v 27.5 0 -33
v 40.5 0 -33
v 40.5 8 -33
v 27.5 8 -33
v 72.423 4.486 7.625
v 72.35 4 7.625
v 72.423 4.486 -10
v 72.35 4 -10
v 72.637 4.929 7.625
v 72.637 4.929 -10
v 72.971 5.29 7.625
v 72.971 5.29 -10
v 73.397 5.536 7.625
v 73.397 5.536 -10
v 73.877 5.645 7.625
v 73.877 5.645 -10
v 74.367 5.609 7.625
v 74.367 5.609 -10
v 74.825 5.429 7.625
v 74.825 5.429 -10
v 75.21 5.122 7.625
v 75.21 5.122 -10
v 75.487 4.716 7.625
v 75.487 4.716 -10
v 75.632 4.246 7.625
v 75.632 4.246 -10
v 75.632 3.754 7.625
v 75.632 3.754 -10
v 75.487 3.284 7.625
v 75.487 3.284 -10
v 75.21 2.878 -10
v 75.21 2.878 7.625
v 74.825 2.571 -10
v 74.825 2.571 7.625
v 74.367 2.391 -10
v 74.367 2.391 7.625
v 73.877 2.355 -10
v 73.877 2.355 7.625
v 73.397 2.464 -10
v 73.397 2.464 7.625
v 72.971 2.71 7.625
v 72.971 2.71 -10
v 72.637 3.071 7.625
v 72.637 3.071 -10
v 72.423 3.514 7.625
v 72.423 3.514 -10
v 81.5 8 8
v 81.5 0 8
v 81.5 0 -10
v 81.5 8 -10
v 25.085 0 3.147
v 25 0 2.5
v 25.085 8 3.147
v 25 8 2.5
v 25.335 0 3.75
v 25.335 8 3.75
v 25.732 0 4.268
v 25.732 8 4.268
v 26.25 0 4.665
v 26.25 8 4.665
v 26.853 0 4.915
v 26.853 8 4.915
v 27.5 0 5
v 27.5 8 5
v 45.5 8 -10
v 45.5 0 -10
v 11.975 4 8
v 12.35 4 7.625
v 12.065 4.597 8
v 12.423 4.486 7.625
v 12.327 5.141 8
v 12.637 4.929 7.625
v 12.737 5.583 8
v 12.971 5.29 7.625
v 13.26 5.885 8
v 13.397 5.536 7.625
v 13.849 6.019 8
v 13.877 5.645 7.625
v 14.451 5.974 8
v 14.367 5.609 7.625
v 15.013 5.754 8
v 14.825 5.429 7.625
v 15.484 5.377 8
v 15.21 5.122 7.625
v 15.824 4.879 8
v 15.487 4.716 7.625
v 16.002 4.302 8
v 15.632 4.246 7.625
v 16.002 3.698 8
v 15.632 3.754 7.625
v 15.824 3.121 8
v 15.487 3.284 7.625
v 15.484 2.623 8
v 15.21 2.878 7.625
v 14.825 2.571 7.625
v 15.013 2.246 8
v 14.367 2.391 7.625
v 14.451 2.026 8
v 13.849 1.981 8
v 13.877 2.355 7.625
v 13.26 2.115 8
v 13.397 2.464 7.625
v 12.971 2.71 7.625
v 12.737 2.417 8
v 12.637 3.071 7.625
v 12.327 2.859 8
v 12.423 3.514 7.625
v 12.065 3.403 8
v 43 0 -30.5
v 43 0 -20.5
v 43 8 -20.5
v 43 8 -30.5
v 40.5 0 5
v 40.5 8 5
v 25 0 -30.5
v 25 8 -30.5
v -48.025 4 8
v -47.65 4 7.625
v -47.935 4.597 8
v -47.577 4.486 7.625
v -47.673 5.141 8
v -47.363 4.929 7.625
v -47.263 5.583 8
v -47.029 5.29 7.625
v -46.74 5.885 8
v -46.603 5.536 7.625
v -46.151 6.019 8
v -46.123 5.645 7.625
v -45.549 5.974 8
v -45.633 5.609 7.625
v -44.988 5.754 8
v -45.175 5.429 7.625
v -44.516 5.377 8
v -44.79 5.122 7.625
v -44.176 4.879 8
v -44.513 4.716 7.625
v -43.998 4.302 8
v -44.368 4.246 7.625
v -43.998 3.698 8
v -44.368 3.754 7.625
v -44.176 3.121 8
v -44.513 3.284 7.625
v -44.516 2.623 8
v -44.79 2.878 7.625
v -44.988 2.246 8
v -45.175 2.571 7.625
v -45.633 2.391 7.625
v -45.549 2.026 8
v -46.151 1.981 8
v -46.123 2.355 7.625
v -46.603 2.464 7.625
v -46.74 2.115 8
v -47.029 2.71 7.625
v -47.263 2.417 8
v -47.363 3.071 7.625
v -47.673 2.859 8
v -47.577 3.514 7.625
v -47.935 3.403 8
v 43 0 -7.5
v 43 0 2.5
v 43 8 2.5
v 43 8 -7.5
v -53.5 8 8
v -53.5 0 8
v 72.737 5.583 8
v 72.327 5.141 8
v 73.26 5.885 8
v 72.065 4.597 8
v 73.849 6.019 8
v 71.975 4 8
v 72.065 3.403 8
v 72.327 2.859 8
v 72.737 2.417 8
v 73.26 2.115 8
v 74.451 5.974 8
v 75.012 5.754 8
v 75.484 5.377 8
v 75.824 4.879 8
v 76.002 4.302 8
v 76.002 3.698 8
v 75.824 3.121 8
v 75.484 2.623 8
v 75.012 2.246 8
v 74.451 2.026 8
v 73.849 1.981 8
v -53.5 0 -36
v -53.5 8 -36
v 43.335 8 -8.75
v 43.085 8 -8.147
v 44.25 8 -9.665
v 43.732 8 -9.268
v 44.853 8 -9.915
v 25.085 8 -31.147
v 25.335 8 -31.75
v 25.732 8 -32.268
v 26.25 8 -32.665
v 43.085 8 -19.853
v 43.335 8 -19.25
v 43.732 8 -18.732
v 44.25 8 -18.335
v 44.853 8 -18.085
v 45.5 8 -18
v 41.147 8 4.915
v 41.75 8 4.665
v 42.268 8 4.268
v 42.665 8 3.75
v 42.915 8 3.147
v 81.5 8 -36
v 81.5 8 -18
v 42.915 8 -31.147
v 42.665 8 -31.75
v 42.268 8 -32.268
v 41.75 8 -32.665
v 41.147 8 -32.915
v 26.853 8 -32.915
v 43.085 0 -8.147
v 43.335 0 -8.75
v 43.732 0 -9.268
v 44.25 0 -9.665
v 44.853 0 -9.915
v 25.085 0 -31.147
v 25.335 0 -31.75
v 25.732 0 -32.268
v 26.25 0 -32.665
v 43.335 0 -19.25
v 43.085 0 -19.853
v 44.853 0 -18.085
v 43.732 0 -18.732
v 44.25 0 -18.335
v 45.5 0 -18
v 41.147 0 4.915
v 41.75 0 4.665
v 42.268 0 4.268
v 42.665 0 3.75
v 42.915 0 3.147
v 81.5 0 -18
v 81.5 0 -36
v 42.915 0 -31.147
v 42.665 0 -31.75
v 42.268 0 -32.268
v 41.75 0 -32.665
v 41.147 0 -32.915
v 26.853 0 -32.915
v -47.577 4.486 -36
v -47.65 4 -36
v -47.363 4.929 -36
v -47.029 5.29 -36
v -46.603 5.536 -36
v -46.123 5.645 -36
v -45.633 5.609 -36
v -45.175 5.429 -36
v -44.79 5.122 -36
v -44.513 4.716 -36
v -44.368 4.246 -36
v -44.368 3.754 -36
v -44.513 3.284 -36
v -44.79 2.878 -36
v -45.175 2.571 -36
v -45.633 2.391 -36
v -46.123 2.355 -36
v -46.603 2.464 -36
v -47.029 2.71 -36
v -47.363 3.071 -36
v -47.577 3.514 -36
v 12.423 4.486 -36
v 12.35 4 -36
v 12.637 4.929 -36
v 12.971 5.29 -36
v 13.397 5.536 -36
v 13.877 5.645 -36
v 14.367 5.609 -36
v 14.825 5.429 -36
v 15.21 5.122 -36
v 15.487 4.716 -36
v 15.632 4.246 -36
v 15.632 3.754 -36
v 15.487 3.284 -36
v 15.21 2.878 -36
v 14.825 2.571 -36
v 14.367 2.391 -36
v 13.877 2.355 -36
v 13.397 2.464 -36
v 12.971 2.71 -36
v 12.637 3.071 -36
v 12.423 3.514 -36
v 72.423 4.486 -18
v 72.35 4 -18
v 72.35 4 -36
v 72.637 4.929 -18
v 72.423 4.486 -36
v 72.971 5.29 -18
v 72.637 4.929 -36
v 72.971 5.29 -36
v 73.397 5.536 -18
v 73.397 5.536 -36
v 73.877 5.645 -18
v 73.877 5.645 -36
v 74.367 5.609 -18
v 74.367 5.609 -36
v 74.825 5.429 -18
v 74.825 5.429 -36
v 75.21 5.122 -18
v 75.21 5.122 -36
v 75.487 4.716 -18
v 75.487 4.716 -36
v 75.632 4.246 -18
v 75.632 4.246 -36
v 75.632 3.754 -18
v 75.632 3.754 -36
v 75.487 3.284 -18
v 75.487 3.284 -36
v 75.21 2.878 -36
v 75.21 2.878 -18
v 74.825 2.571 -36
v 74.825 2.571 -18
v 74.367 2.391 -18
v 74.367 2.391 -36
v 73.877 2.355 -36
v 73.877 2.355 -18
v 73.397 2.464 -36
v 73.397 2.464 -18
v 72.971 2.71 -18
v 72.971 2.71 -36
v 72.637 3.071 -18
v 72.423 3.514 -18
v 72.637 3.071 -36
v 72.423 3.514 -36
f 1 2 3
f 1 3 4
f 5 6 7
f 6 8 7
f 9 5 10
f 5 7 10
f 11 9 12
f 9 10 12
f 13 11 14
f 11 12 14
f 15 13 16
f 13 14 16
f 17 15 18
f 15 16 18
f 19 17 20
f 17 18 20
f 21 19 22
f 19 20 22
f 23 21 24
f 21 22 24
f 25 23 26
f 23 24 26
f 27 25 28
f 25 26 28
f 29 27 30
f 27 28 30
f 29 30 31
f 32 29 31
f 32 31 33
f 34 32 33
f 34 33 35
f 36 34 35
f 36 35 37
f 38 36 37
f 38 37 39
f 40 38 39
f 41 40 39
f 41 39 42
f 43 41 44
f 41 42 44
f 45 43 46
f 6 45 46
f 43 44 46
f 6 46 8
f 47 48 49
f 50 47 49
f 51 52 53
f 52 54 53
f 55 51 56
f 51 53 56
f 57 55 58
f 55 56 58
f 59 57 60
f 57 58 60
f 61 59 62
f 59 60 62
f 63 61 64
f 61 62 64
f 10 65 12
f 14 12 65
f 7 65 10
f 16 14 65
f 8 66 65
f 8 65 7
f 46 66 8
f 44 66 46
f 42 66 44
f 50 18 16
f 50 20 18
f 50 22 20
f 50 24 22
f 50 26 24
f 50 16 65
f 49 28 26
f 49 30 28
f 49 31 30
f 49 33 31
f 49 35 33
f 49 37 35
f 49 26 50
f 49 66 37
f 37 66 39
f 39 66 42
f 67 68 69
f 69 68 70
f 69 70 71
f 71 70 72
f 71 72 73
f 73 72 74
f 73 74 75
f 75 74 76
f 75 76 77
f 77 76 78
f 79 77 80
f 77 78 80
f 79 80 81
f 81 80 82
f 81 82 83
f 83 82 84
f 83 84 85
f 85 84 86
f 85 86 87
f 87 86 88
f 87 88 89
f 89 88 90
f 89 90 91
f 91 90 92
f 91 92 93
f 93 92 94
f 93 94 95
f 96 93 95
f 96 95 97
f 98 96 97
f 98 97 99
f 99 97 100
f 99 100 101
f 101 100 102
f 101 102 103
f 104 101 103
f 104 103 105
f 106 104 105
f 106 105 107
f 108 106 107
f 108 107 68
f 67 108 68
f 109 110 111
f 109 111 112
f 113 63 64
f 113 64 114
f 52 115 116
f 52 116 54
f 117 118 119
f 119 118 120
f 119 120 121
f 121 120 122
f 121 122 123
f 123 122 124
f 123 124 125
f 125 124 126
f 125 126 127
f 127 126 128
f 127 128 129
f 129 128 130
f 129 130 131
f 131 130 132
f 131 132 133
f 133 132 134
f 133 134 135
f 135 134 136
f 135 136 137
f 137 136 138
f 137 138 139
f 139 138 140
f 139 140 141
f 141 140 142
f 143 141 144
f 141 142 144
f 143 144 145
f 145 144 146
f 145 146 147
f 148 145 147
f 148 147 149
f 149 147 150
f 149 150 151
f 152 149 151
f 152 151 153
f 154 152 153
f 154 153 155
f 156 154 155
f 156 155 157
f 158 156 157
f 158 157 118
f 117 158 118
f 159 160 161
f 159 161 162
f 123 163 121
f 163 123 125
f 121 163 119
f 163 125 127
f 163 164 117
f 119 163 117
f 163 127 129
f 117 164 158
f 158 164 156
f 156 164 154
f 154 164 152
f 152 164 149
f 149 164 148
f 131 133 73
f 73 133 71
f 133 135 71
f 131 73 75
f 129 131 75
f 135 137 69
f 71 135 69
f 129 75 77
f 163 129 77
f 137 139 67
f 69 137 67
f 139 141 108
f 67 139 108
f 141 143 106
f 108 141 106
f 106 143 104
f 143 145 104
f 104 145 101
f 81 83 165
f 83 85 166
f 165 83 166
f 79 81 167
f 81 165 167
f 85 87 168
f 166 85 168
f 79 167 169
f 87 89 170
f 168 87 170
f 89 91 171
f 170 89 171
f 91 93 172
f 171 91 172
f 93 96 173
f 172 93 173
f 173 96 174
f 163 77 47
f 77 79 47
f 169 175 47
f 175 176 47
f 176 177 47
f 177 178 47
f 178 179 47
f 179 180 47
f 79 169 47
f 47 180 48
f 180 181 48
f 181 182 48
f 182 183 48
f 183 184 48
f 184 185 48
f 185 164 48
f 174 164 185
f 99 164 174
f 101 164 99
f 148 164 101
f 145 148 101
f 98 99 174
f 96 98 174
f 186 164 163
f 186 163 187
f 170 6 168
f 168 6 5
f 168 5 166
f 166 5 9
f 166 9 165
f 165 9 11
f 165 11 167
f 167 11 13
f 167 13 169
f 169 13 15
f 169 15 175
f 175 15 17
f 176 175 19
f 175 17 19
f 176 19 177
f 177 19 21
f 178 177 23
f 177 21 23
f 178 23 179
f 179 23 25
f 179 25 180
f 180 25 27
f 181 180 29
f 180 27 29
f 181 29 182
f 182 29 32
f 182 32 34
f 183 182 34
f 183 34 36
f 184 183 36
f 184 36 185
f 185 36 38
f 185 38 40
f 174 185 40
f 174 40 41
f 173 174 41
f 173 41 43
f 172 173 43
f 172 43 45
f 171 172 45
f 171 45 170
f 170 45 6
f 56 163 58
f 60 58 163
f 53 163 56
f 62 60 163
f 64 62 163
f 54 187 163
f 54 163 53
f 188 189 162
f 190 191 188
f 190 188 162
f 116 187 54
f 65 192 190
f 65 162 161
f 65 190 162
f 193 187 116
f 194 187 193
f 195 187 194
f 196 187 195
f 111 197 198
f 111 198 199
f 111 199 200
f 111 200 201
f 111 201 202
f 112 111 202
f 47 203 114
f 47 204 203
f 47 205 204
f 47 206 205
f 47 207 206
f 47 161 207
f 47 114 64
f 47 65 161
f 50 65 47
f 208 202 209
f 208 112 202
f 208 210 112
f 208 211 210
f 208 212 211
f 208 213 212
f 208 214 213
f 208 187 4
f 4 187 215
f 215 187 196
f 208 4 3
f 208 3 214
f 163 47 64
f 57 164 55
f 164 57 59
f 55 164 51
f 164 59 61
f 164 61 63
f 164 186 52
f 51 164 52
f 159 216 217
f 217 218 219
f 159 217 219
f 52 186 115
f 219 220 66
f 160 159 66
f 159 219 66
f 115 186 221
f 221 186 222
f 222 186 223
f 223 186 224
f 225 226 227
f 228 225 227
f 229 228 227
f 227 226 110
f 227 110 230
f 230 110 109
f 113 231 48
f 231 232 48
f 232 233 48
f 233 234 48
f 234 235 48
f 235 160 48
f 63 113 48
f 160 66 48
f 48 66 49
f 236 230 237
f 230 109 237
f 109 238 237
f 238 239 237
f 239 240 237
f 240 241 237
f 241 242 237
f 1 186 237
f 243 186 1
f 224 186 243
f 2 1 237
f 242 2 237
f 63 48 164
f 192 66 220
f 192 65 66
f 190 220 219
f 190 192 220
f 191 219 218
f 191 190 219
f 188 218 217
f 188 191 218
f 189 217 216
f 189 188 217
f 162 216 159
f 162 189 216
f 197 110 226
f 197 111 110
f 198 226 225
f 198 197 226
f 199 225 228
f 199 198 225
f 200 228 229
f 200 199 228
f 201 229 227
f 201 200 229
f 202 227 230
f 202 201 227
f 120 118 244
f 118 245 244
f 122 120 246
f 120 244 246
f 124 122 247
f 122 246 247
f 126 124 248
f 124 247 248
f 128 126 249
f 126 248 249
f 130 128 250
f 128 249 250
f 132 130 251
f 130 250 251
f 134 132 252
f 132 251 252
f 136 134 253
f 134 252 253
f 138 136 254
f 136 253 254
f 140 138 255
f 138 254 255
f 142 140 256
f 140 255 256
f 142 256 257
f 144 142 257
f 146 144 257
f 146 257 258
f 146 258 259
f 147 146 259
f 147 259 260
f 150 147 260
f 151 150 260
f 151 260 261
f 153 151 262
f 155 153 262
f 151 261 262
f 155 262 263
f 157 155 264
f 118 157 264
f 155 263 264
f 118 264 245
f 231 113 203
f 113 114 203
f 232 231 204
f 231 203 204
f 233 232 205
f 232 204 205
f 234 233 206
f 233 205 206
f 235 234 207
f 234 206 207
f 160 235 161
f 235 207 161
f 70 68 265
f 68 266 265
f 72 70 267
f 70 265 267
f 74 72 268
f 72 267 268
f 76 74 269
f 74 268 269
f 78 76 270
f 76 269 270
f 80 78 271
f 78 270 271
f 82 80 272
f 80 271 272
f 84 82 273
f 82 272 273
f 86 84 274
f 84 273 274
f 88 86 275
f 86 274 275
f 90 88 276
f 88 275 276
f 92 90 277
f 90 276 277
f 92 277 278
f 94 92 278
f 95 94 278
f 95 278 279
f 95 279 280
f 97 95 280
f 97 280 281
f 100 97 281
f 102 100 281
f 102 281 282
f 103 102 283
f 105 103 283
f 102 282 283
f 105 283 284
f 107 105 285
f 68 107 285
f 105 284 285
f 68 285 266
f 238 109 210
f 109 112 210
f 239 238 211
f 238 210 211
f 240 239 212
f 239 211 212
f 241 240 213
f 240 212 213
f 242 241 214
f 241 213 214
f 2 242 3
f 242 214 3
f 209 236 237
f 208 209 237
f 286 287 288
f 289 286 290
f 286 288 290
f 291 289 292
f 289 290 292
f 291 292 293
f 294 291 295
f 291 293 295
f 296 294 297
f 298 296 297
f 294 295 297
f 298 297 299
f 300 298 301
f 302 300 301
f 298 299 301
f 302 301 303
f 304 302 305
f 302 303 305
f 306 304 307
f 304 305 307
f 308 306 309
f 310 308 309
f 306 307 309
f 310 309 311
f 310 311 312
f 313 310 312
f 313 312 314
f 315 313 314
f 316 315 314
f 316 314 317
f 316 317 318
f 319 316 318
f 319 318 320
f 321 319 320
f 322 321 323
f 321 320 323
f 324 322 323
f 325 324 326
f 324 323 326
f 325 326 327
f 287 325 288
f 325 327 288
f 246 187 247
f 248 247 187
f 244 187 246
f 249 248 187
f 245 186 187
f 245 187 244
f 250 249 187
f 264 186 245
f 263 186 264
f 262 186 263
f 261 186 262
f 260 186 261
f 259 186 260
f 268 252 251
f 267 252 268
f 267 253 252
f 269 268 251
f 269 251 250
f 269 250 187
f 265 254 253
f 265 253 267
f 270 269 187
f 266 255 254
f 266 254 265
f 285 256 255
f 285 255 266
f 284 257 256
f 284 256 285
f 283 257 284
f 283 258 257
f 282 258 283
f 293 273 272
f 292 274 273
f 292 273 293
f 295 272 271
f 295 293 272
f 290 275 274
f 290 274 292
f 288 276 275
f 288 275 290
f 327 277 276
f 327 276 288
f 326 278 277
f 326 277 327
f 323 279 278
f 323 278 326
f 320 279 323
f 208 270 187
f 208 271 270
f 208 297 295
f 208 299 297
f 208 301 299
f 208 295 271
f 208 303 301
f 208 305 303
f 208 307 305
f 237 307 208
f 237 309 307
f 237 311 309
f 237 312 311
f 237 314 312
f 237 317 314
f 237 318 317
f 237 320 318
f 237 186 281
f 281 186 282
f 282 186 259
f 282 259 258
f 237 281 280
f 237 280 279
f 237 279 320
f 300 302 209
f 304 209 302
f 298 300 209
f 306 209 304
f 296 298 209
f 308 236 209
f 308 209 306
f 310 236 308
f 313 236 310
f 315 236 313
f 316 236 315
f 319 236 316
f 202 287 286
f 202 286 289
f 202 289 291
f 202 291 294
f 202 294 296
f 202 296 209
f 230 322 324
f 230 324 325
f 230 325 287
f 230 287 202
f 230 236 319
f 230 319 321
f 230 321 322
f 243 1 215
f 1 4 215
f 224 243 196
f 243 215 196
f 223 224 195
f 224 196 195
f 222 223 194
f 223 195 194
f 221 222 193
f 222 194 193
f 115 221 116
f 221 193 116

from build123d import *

# Parameters (mm, degrees)
SKETCH1_W                       = 135
SKETCH1_H                       = 44
BOSS_EXTRUDE1_DEPTH             = 8
CUT_EXTRUDE1_DEPTH              = 10
FILLET1_R                       = 2.5
FILLET2_R                       = 2.5
M4X0_7_TAPPED_HOLE1_D           = 3.3
M4X0_7_TAPPED_HOLE1_CSINK_D     = 4.05
M4X0_7_TAPPED_HOLE1_CSINK_ANGLE = 90


with BuildPart() as part:
    # Sketch1 → Boss-Extrude1 (new body)
    with BuildSketch(Plane(origin=(0, 0, 0), x_dir=(1, 0, 0), z_dir=(0, 1, 0))):
        with Locations((14, 14)):
            Rectangle(SKETCH1_W, SKETCH1_H)
    extrude(amount=BOSS_EXTRUDE1_DEPTH)

    # Sketch7 → Cut-Extrude1 (cut)
    with BuildSketch(Plane(origin=(0, 0, 0), x_dir=(1, 0, 0), z_dir=(0, 1, 0))):
        Polygon((81.5, 10), (81.5, 18), (43, 18), (43, 33), (25, 33), (25, -5), (43, -5), (43, 10), align=None)
    extrude(amount=CUT_EXTRUDE1_DEPTH, mode=Mode.SUBTRACT)

    # Fillet1
    fillet1_edges = [part.edges().sort_by_distance(p)[0] for p in [
        (43, 4, -33),
        (25, 4, -33),
        (25, 4, 5),
        (43, 4, 5),
    ]]
    fillet(fillet1_edges, radius=FILLET1_R)

    # Fillet2
    fillet2_edges = [part.edges().sort_by_distance(p)[0] for p in [
        (43, 4, -18),
        (43, 4, -10),
    ]]
    fillet(fillet2_edges, radius=FILLET2_R)

    # M4x0.7 Tapped Hole1 (through all)
    with Locations(Plane.XY.offset(8)):
        with Locations((-46, 4), (14, 4), (74, 4)):
            CounterSinkHole(M4X0_7_TAPPED_HOLE1_D / 2, M4X0_7_TAPPED_HOLE1_CSINK_D / 2, counter_sink_angle=M4X0_7_TAPPED_HOLE1_CSINK_ANGLE)


solid = part.part
